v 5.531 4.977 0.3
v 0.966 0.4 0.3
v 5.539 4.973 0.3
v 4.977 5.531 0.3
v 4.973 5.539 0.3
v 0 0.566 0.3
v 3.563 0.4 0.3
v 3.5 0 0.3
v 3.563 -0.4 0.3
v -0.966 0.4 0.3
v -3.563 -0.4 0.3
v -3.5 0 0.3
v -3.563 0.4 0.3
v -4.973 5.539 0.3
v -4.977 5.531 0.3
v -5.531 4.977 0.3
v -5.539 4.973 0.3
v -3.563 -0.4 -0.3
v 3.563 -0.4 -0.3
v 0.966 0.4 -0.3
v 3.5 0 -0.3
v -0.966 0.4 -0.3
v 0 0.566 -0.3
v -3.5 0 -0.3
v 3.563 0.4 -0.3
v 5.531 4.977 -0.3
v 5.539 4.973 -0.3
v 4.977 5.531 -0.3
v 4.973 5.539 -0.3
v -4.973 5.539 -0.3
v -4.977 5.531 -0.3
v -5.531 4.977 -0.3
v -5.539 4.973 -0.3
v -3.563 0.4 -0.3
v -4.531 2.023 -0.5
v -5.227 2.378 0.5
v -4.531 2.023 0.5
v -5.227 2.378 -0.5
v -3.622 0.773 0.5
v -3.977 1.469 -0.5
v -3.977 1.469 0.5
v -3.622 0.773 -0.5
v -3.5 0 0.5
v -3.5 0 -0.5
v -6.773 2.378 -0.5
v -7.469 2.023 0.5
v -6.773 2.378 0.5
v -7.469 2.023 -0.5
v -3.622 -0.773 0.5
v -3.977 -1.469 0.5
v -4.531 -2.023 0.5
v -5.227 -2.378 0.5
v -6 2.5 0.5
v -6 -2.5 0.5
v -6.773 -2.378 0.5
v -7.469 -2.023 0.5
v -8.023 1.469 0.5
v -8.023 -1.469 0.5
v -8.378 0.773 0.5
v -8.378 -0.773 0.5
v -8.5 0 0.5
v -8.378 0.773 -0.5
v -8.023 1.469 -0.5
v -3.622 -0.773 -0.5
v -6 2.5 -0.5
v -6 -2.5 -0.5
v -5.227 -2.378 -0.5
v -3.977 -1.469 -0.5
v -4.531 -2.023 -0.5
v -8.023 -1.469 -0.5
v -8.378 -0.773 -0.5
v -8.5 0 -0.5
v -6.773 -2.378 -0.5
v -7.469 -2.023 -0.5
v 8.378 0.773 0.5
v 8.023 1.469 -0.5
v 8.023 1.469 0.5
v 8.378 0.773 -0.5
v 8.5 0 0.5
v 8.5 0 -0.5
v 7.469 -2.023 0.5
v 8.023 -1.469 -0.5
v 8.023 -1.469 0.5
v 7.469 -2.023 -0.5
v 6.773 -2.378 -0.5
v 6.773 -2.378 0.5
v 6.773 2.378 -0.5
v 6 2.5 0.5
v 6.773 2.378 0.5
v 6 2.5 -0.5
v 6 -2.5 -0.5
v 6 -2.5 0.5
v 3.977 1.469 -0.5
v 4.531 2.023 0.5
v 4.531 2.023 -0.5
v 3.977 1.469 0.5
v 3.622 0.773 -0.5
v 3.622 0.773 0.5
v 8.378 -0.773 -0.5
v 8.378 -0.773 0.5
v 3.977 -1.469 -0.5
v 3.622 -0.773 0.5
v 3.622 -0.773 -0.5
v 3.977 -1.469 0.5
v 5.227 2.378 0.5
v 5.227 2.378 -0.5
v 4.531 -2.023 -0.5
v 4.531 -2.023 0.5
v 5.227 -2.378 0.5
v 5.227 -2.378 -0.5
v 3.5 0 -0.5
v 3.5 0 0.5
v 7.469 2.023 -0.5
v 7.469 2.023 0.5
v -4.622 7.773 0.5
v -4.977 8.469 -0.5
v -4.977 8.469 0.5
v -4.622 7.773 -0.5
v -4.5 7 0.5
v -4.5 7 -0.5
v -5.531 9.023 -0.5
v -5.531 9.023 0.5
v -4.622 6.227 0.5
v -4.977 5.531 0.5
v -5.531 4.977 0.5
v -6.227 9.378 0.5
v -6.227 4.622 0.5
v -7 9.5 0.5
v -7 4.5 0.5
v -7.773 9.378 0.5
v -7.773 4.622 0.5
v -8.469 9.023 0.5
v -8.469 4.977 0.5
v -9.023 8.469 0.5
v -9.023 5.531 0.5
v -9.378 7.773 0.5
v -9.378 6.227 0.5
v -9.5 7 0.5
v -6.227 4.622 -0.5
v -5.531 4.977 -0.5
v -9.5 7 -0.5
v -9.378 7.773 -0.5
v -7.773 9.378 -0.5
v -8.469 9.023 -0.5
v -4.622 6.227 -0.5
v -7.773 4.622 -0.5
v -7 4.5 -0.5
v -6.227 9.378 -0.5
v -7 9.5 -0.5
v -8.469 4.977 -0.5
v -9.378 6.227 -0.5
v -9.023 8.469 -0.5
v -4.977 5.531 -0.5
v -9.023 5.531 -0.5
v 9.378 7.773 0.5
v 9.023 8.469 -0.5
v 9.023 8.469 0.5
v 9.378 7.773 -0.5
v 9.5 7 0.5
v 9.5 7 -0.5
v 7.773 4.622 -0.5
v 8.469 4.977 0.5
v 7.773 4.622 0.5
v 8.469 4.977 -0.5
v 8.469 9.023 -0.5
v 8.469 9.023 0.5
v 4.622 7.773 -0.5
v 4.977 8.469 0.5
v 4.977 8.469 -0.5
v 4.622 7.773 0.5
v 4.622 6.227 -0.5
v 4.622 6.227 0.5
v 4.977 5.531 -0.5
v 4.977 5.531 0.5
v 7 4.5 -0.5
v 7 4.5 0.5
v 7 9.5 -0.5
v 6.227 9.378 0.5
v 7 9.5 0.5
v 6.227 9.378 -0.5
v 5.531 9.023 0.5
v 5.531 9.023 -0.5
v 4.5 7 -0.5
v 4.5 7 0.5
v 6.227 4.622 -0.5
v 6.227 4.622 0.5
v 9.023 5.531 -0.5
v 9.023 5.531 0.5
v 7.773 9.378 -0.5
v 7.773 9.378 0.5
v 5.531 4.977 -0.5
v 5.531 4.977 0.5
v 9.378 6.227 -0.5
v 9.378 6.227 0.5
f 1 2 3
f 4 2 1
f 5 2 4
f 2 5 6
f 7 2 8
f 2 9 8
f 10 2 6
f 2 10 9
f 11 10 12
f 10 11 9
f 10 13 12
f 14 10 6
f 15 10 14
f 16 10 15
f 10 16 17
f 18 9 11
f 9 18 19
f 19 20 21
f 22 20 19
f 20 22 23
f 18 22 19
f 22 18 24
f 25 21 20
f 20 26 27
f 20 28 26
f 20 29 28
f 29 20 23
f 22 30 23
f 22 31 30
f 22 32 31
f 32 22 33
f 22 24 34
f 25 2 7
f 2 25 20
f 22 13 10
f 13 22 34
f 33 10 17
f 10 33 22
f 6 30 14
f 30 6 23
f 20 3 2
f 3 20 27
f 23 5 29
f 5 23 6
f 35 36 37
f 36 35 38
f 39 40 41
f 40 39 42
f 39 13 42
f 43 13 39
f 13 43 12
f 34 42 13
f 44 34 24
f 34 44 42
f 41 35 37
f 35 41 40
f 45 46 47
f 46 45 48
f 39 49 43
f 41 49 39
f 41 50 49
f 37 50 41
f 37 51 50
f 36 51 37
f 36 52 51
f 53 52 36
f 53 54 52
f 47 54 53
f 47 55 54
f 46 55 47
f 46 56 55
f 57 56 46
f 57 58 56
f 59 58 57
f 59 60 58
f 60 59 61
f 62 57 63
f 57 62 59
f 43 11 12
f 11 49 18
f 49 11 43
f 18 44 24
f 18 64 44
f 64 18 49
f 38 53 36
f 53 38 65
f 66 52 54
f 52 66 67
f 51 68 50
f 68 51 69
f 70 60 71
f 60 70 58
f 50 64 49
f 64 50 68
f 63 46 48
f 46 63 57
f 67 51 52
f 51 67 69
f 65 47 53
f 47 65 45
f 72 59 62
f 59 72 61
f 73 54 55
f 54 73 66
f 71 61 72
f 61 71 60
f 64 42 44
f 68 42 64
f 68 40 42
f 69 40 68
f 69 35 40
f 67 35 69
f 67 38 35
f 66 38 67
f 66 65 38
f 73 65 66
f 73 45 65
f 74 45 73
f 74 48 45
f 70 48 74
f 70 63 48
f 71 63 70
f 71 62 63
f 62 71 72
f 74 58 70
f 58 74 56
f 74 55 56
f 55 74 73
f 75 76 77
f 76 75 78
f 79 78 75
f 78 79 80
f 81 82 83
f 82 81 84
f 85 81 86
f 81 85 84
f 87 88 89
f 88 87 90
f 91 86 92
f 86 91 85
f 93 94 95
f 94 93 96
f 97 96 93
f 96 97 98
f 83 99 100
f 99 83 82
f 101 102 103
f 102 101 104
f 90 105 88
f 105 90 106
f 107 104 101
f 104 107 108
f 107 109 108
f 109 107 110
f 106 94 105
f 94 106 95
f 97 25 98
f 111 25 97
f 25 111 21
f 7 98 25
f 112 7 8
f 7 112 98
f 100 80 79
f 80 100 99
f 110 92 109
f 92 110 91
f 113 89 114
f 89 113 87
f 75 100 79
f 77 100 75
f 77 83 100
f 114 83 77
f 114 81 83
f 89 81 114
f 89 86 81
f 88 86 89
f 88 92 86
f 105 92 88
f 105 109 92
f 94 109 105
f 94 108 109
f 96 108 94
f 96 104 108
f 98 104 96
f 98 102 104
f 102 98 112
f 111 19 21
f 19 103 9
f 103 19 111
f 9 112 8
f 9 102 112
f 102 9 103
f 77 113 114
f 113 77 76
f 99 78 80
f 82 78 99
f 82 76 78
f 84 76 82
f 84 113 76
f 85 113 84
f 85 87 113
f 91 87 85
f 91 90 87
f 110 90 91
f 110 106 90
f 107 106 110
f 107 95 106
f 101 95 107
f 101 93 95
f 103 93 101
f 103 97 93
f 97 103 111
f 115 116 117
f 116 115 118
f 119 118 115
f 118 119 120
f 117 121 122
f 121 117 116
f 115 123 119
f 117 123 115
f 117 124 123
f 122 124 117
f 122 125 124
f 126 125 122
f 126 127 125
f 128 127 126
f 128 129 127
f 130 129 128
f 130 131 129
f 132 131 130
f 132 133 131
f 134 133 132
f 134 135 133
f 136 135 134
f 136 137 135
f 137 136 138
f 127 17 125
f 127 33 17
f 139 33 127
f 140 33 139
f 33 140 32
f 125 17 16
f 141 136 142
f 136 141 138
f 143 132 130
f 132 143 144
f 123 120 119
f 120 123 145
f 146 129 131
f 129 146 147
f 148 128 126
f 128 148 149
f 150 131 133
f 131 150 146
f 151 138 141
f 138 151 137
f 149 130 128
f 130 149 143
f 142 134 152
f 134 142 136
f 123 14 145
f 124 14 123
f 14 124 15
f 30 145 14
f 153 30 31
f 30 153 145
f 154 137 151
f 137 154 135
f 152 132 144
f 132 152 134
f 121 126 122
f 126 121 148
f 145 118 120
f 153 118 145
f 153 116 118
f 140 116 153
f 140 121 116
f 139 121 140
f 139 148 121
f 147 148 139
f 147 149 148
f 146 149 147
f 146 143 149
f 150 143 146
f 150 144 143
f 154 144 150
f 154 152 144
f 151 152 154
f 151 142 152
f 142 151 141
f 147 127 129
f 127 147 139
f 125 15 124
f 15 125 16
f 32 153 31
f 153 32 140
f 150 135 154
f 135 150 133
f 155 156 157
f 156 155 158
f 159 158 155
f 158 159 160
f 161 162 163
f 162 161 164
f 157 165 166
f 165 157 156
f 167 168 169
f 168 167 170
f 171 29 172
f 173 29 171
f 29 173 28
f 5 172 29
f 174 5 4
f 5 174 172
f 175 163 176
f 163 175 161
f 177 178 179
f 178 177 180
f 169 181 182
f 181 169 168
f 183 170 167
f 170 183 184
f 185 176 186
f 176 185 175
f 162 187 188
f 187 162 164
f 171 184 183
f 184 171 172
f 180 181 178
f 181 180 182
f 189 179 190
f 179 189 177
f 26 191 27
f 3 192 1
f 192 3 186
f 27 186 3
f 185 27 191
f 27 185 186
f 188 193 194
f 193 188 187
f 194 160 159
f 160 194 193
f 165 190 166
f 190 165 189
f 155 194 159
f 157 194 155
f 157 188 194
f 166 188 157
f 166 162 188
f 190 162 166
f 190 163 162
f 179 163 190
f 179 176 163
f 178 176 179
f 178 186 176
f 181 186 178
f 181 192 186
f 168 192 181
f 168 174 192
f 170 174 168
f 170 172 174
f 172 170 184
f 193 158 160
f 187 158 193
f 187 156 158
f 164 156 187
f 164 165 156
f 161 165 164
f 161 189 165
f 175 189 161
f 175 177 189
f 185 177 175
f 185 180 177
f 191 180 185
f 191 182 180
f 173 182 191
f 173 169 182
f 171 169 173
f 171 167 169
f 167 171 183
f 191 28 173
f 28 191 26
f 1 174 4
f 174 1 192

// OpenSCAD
circleThickness = 1;
radius = 2.5;


color("DarkGray")
translate([0,0,0])
rotate([0,0,90])
cube([0.8,9,0.6],center=true);

color("DarkGray")
translate([-3.1,3.1,0])
rotate([0,0,45])
cube([0.8,9,0.6],center=true);
color("DarkGray")
translate([3.1,3.1,0])
rotate([0,0,-45])
cube([0.8,9,0.6],center=true);




translate([-6,0,0])
color("Black")
cylinder(circleThickness, radius, radius, $fn=20,center=true);
translate([6,0,0])
color("Black")
cylinder(circleThickness, radius, radius, $fn=20,center=true);

translate([-7,7,0])
color("Black")
cylinder(circleThickness, radius, radius, $fn=20,center=true);
translate([7,7,0])
color("Black")
cylinder(circleThickness, radius, radius, $fn=20,center=true);
